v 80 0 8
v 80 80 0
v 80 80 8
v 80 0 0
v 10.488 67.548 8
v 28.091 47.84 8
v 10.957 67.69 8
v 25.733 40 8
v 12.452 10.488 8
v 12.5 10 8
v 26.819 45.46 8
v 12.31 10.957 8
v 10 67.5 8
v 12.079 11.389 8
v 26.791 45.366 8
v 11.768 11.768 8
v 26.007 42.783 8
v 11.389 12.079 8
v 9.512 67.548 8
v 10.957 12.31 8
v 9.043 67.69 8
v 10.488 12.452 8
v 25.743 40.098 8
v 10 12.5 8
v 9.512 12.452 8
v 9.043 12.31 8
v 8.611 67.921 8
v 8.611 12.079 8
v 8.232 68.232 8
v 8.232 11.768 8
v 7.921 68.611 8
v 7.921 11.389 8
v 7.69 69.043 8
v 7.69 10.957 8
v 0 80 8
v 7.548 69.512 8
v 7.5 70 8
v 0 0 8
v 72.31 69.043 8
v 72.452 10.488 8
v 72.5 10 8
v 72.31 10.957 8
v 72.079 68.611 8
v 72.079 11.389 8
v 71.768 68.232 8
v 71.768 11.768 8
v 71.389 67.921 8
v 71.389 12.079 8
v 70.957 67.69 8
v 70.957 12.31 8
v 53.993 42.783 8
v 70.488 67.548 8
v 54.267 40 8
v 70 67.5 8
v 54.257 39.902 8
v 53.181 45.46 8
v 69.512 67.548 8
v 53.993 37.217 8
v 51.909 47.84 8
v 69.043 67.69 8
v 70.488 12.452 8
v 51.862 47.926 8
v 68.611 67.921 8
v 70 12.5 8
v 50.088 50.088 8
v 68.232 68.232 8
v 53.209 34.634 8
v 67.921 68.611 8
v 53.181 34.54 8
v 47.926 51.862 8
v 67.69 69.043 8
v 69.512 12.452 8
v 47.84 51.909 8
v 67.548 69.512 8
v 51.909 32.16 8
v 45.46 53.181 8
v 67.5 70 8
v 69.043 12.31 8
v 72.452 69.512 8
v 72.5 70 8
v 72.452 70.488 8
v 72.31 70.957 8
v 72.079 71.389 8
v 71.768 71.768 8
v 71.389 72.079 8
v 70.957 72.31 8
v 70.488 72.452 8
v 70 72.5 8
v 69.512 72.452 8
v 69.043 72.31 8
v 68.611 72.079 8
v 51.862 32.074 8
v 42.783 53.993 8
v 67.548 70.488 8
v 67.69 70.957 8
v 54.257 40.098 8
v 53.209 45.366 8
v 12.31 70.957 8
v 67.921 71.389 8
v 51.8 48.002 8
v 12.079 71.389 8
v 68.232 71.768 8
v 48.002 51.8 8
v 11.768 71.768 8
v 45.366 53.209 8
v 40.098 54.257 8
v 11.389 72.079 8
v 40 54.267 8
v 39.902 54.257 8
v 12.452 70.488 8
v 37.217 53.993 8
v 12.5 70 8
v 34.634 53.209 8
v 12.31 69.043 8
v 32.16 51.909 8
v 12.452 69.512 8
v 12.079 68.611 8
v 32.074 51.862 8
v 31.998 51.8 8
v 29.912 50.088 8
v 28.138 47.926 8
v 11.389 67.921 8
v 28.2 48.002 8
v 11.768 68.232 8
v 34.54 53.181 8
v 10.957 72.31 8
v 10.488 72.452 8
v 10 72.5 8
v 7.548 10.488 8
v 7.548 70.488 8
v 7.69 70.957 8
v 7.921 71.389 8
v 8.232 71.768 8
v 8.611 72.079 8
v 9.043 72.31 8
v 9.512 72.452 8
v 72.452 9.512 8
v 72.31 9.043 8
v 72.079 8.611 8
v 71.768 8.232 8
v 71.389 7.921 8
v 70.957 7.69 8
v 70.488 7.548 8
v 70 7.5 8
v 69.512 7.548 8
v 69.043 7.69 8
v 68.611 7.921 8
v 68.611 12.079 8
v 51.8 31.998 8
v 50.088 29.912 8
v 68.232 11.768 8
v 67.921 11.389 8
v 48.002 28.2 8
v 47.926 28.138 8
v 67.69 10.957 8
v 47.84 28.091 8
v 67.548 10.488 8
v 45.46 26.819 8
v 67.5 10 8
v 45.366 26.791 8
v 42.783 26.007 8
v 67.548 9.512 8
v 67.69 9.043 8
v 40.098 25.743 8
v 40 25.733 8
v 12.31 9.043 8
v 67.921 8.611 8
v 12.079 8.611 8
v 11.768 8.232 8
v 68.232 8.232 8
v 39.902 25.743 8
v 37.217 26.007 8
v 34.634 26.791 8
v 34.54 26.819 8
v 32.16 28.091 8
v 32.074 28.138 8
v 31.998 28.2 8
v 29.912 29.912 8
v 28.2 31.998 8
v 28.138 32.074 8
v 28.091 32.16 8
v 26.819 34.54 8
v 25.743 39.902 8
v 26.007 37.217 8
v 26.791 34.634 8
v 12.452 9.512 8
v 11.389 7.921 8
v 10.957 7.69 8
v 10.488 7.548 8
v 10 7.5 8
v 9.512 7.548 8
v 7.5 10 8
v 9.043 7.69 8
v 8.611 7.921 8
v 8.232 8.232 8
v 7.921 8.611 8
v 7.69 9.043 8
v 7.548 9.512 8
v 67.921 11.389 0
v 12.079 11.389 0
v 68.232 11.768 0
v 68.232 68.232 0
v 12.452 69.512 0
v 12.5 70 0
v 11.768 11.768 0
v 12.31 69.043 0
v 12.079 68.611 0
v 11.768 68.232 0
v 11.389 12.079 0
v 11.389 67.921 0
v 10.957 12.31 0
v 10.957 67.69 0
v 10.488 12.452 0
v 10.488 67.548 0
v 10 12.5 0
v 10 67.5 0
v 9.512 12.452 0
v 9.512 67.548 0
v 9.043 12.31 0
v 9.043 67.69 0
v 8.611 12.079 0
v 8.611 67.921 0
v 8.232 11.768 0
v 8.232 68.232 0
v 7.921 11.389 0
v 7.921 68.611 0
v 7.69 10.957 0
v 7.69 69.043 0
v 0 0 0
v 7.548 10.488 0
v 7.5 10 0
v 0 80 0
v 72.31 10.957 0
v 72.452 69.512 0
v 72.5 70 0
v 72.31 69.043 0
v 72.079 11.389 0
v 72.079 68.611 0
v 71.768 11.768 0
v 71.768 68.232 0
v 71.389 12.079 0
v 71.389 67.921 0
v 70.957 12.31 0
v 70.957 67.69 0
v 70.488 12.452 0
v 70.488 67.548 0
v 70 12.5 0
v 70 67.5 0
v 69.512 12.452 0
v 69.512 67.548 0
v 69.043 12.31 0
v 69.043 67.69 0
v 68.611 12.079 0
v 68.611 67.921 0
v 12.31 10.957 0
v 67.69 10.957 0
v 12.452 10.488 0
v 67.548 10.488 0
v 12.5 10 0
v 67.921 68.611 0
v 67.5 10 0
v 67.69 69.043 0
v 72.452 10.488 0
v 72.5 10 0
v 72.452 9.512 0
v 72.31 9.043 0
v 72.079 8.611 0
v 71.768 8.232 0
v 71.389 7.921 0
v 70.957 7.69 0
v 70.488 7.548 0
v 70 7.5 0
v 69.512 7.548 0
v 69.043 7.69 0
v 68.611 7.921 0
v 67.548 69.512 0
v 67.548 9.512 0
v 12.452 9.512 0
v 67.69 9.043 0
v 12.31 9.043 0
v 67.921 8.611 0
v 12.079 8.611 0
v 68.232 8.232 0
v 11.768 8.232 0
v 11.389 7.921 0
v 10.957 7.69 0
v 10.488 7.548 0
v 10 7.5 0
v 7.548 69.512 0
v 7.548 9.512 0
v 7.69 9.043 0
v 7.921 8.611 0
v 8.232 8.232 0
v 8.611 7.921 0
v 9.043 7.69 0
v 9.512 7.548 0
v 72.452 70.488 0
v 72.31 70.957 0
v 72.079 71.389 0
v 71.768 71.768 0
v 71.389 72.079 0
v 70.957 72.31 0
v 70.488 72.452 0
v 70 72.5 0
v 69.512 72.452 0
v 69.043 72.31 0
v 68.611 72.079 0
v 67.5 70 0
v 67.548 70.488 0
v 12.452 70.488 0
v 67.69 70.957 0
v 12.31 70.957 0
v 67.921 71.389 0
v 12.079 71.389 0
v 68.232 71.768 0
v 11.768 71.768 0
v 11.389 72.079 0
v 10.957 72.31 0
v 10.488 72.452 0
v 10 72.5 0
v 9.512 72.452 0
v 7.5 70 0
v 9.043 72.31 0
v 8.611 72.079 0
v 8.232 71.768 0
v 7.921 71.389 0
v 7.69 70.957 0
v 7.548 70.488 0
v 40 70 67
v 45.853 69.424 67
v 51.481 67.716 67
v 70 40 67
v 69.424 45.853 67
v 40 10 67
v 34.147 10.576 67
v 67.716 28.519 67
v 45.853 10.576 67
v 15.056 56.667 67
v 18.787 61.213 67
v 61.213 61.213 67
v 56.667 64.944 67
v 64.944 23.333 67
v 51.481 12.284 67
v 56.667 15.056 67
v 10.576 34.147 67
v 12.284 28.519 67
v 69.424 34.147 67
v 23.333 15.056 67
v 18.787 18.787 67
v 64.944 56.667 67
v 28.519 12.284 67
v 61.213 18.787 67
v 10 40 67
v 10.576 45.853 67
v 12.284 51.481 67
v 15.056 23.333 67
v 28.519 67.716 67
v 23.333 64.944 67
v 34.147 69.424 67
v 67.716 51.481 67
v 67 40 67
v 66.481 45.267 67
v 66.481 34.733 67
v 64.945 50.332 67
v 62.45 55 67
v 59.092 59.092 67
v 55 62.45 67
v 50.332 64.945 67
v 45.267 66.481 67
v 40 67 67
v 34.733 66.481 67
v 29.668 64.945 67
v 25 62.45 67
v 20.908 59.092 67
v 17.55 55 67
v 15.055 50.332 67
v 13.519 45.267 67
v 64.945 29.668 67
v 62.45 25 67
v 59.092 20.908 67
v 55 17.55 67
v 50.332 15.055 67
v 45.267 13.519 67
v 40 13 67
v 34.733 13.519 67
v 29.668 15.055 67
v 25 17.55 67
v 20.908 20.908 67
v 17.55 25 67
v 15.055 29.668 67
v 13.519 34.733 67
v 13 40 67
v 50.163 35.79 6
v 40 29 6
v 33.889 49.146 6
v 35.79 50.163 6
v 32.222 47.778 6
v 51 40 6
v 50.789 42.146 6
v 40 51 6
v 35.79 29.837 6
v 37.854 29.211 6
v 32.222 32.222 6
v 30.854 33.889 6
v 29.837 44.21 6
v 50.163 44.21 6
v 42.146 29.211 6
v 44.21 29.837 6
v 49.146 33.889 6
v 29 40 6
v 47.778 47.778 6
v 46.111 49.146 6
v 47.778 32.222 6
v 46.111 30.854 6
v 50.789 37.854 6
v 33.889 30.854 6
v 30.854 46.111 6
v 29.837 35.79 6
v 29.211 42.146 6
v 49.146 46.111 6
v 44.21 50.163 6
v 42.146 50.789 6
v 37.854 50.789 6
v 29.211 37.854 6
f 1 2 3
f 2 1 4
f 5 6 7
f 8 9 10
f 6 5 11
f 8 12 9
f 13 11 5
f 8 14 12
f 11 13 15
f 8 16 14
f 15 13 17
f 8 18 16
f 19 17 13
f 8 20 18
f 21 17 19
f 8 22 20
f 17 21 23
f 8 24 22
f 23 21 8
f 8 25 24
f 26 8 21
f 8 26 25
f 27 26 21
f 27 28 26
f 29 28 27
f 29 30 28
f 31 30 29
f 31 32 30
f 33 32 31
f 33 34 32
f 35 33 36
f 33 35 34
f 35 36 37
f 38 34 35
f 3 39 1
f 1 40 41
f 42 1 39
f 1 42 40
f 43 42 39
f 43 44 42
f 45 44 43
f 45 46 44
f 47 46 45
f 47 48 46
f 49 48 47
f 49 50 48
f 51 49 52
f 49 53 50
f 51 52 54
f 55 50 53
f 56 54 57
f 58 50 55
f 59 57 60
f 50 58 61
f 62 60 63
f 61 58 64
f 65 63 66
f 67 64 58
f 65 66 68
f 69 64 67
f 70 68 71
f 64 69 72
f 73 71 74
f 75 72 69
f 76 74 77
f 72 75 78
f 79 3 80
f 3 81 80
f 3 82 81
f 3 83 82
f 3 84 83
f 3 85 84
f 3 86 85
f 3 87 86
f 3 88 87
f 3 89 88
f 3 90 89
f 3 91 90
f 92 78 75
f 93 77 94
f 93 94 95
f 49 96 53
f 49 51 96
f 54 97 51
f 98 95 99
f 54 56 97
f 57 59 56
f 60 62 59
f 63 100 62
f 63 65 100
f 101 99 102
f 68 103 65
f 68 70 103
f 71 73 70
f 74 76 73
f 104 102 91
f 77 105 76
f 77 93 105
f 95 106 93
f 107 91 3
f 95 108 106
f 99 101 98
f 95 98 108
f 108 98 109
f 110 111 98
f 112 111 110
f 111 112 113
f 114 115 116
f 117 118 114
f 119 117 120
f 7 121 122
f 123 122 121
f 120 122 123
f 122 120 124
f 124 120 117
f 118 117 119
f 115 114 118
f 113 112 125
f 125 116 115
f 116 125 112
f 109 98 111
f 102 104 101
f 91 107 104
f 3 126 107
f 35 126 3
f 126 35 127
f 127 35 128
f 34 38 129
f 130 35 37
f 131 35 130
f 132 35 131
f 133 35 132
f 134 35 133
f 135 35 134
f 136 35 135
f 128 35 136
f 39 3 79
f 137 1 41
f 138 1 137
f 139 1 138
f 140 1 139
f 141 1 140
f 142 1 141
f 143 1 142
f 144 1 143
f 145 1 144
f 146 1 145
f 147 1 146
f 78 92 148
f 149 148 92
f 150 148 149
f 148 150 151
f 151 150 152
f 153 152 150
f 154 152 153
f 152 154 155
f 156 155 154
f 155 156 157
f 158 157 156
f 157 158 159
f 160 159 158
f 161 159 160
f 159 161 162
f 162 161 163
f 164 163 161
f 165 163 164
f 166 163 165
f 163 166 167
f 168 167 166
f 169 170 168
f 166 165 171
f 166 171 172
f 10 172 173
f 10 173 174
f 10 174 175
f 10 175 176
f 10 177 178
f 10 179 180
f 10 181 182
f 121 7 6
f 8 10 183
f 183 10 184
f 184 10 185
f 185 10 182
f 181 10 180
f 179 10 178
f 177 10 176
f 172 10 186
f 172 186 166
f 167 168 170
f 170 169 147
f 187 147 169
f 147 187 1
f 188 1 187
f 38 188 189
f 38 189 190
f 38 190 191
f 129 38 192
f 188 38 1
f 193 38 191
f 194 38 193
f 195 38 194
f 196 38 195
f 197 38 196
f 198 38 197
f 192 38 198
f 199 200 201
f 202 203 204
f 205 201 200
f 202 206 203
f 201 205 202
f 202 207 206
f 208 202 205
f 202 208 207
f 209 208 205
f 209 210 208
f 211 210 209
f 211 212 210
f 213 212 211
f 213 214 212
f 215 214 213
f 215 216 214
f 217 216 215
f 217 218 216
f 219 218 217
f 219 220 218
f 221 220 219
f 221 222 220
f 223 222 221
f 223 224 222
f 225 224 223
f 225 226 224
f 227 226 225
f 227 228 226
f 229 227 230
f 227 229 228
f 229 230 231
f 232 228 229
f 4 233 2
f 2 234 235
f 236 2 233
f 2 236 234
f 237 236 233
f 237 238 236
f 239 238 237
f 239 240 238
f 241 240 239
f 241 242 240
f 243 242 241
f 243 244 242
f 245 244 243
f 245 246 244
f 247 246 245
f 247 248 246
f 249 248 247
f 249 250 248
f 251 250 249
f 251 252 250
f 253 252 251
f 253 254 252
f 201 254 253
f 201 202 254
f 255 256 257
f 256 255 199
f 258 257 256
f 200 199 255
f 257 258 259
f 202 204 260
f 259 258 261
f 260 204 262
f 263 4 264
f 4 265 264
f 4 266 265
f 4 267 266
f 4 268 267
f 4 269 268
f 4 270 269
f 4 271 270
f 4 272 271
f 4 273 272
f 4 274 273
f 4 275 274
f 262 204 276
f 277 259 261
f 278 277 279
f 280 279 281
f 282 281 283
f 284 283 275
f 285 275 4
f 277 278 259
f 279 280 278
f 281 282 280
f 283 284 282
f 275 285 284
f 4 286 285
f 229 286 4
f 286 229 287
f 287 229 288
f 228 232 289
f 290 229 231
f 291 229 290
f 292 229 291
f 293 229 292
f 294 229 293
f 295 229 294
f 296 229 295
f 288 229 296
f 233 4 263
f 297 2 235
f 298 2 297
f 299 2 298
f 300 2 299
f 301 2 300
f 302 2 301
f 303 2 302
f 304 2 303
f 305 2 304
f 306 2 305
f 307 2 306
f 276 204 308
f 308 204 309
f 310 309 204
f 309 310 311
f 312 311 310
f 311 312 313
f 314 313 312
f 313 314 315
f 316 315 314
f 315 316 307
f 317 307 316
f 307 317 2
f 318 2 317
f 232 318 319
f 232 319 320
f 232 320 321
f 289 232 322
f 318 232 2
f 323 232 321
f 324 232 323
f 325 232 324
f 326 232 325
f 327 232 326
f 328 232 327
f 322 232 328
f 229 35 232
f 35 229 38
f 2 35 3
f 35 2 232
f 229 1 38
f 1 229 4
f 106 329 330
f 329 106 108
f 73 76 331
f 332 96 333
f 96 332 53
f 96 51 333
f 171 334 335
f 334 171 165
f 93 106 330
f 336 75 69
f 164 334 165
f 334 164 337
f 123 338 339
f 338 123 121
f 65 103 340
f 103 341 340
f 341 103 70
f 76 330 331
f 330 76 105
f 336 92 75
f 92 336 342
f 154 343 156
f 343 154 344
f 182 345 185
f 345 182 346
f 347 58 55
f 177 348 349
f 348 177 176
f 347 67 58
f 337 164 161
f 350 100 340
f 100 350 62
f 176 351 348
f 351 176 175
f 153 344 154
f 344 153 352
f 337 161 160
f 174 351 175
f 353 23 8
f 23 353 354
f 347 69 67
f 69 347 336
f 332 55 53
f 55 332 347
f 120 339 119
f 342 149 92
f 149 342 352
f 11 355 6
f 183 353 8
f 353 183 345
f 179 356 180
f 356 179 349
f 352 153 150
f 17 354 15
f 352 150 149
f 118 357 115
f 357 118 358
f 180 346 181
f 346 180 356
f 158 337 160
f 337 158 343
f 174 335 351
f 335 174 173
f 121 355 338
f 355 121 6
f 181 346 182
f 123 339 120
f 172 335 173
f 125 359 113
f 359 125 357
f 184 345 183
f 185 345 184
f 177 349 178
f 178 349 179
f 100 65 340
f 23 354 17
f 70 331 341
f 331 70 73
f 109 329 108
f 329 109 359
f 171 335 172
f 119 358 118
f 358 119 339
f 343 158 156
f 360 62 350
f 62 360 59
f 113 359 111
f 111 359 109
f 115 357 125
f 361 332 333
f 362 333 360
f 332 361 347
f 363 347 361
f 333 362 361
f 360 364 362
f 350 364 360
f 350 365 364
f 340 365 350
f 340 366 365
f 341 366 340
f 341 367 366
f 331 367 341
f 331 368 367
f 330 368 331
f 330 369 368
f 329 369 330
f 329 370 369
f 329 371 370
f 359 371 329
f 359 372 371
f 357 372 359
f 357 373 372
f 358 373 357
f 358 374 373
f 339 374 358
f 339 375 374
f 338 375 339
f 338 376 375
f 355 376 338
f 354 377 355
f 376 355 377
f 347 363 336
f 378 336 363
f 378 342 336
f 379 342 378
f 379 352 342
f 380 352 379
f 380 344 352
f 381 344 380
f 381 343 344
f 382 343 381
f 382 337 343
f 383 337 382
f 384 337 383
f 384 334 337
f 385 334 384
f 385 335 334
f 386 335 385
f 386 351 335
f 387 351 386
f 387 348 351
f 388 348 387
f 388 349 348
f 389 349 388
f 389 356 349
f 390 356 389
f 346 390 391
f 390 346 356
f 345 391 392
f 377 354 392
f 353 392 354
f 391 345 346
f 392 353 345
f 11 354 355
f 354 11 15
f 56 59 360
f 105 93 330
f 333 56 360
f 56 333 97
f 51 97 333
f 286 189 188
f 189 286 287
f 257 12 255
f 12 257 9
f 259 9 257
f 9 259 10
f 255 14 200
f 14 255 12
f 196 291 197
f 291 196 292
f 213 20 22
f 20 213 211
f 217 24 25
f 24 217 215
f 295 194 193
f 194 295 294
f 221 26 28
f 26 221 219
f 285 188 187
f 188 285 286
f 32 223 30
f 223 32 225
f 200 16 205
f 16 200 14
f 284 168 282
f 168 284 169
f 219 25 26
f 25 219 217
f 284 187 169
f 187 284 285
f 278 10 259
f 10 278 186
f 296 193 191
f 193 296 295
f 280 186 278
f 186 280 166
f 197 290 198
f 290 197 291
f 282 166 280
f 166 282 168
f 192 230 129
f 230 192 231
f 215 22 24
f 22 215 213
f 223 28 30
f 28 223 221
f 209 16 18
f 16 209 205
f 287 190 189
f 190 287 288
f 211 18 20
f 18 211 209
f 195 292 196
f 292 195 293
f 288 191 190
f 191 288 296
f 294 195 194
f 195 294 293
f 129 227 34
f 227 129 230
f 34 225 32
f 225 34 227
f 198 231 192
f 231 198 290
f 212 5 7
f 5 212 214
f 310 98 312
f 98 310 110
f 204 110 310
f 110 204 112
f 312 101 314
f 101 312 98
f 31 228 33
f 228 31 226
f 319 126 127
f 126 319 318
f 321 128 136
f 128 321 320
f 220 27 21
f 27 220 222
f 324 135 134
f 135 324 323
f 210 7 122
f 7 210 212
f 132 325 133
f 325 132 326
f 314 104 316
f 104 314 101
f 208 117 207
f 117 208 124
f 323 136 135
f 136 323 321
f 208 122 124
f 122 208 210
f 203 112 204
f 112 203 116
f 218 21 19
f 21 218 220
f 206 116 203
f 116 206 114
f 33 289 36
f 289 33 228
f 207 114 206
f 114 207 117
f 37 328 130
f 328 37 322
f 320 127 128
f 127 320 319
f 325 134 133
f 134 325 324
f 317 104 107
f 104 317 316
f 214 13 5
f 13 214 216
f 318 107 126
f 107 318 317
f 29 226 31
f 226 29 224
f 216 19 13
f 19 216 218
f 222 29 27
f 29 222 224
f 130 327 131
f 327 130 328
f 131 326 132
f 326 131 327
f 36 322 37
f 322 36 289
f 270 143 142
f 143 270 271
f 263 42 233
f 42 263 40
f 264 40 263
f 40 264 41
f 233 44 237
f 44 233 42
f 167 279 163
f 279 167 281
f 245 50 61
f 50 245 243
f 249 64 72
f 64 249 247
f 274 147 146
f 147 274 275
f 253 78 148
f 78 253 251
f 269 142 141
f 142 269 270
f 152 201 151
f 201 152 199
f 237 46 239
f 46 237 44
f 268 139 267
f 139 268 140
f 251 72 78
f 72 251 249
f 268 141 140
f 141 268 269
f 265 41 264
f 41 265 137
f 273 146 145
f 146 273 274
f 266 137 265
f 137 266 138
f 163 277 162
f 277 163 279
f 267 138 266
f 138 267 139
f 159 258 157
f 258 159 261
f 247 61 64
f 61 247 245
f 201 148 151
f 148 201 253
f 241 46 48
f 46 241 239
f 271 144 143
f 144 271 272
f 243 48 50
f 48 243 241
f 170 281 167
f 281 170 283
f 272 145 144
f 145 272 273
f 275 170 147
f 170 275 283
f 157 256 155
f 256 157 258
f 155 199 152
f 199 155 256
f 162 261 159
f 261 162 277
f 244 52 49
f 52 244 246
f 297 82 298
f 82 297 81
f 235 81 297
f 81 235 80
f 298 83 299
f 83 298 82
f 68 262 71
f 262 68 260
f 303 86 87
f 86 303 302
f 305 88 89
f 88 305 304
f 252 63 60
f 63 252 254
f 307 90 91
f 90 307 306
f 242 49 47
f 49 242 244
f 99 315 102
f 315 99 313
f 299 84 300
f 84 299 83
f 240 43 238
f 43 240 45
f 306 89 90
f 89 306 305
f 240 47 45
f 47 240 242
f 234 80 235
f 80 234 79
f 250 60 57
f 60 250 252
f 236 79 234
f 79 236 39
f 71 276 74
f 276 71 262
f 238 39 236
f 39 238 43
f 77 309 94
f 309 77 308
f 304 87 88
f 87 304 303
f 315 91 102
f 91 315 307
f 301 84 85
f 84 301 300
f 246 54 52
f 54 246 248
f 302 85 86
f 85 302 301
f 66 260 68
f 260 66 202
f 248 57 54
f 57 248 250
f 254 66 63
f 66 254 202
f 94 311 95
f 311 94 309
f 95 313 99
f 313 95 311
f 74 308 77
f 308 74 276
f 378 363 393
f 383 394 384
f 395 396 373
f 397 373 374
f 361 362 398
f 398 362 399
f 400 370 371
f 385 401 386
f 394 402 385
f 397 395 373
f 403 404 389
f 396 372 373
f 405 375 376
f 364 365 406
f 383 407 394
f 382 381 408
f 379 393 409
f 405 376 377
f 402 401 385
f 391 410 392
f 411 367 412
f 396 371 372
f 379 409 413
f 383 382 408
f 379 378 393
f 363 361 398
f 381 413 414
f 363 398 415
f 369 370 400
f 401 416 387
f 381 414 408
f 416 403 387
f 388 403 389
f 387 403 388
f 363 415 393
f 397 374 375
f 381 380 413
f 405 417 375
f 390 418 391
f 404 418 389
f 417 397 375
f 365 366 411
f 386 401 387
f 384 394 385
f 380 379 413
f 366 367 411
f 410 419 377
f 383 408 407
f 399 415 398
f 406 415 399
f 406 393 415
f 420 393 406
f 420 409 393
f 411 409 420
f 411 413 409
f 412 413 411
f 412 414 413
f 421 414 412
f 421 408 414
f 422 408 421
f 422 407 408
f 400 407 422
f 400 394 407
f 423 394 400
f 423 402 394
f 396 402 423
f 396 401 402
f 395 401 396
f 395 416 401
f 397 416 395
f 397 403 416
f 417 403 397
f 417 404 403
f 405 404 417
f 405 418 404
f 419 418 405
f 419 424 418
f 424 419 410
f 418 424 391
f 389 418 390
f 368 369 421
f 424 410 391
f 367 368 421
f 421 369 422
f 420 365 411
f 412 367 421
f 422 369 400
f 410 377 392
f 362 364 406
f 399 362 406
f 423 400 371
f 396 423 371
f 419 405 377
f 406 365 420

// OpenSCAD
$fn = 32;

// ----------------------------------------------------------------------
// Hopper: flanged with square flange
// ----------------------------------------------------------------------

// --- parameters (mm) ---
fl = 80;                  // flange side, X and Y
fl_t = 8;                 // flange thickness
cone_h = 60;              // cone height above the flange
top_d = 60;               // cone mouth diameter
bot_d = 28;               // cone spout diameter
wall = 3;                 // cone wall thickness
hole_r = 2.5;             // flange hole radius
hole_in = 10;             // hole inset from the corners
fit_tol = 0.02;           // tolerance for press fits, mm
free_tol = 0.2;           // tolerance for clearance fits, mm

bore_d = bot_d - 2 * wall;  // spout bore diameter
total_h = fl_t + cone_h - 1;  // overall height

difference() {
  union() {
    cube([fl, fl, fl_t]);
    translate([fl / 2, fl / 2, fl_t - 1])
      cylinder(h = cone_h, d1 = bot_d, d2 = top_d);
  }
  translate([fl / 2, fl / 2, fl_t - 2])
    cylinder(h = cone_h + 1, d1 = bore_d, d2 = top_d - 2 * wall);
  for (sx = [0, 1], sy = [0, 1])
    translate([sx ? fl - hole_in : hole_in,
               sy ? fl - hole_in : hole_in, -1])
      cylinder(r = hole_r, h = fl_t + 2);
}
